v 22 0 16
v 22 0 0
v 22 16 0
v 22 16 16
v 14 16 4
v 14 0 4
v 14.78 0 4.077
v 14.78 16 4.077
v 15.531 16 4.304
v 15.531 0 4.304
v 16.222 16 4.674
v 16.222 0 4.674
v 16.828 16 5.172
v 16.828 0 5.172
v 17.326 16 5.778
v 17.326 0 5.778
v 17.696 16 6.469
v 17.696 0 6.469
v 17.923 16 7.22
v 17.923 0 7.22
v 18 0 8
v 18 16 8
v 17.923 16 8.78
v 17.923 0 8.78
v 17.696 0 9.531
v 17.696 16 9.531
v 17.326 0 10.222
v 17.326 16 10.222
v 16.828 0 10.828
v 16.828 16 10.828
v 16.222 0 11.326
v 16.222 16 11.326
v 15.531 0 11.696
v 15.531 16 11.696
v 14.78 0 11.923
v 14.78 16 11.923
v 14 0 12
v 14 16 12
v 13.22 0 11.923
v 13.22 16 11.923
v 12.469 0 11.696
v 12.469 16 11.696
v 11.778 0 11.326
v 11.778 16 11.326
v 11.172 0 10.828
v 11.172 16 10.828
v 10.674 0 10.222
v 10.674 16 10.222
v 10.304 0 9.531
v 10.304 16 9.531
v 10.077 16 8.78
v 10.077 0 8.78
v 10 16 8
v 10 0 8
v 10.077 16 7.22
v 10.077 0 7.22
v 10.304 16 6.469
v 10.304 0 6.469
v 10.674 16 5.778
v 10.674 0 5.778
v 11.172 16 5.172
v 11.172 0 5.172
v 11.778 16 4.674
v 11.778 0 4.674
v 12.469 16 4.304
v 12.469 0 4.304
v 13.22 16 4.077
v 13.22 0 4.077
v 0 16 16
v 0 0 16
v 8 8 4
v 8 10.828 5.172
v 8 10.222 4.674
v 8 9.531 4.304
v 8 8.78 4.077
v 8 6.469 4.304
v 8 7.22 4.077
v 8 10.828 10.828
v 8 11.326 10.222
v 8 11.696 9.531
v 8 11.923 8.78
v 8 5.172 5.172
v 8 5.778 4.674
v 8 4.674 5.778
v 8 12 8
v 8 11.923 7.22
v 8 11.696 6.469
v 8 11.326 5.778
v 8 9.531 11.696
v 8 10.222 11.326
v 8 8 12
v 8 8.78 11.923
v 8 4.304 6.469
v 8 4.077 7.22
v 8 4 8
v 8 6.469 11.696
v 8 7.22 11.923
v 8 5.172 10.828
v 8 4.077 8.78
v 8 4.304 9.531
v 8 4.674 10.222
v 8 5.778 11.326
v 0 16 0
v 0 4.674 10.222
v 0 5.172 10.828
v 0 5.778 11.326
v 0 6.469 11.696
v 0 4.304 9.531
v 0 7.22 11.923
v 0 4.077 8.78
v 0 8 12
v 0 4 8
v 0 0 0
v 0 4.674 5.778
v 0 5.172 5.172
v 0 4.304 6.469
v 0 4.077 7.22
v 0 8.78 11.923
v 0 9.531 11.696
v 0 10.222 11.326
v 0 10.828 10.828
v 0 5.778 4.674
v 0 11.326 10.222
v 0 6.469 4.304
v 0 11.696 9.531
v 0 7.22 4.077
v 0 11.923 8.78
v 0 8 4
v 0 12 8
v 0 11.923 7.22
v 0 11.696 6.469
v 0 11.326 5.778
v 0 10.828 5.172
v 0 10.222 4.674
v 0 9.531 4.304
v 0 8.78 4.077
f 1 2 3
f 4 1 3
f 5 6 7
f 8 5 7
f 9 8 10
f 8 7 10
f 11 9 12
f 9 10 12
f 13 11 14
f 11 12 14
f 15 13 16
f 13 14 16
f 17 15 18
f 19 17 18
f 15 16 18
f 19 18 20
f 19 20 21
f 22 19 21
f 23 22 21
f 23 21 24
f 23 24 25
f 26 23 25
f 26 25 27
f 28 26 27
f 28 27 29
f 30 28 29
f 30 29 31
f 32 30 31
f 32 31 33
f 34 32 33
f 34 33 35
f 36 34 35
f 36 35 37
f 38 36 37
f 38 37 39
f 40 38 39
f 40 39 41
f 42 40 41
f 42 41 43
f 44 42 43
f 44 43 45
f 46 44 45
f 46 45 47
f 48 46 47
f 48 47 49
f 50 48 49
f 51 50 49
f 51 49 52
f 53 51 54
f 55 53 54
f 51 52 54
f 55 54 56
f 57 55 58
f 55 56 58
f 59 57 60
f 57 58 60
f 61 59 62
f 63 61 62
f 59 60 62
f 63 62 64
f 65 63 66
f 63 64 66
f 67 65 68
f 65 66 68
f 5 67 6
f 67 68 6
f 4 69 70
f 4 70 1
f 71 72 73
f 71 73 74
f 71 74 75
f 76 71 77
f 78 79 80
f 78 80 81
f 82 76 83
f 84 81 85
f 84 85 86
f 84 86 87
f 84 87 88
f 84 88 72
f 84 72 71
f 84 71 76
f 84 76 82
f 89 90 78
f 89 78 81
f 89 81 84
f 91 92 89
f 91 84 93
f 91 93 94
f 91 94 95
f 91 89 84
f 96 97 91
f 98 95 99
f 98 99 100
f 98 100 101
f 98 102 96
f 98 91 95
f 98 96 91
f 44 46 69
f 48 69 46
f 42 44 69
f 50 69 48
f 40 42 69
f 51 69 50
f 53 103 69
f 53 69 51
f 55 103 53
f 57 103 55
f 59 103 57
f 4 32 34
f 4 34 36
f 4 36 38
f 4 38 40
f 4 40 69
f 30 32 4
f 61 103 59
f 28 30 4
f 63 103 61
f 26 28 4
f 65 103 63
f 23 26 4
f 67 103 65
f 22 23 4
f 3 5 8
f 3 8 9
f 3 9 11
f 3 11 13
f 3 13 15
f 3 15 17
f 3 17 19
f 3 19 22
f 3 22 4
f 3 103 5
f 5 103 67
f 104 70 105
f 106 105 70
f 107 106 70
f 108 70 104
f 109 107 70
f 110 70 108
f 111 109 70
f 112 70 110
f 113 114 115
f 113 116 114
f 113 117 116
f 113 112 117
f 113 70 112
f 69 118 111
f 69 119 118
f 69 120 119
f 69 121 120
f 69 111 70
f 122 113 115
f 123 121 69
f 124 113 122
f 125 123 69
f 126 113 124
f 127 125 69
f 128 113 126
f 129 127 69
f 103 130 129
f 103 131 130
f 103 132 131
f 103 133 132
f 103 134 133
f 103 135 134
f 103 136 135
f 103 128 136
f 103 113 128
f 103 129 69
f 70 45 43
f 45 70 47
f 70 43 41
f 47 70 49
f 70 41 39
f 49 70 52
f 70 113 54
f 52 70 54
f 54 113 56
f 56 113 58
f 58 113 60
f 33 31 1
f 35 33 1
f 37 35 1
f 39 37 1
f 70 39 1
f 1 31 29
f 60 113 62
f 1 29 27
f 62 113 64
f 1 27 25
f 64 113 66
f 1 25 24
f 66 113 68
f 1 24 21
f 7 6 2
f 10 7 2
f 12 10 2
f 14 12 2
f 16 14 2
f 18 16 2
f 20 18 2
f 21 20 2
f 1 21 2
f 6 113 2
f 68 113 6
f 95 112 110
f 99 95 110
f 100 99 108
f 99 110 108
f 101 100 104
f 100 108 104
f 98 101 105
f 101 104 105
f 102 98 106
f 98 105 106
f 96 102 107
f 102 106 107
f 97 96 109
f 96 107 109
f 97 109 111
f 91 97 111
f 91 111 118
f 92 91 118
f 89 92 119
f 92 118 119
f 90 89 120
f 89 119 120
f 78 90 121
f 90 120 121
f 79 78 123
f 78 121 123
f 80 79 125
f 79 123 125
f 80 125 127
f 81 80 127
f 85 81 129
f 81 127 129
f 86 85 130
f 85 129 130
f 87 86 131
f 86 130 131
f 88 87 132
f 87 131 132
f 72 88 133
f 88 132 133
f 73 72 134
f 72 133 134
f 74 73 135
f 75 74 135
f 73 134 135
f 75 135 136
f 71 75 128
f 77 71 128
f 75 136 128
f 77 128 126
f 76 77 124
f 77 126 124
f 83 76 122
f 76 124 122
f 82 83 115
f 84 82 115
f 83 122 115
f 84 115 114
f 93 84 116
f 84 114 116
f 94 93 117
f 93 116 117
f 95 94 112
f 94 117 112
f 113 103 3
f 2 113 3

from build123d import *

# Parameters (mm, degrees)
SKETCH1_W           = 22
SKETCH1_H           = 16
BOSS_EXTRUDE1_DEPTH = 16
SKETCH2_R           = 4
CUT_EXTRUDE1_DEPTH  = 8
SKETCH3_R           = 4
CUT_EXTRUDE2_DEPTH  = 17


with BuildPart() as part:
    # Sketch1 → Boss-Extrude1 (new body)
    with BuildSketch(Plane.XY):
        with Locations((11, 8)):
            Rectangle(SKETCH1_W, SKETCH1_H)
    extrude(amount=BOSS_EXTRUDE1_DEPTH)

    # Sketch2 → Cut-Extrude1 (cut)
    with BuildSketch(Plane.ZY):
        with Locations(Location((8, 8, 0), (0, 0, 270))):  # turned: the seam where the file's is
            Circle(SKETCH2_R)
    extrude(amount=-CUT_EXTRUDE1_DEPTH, mode=Mode.SUBTRACT)

    # Sketch3 → Cut-Extrude2 (cut, through all)
    with BuildSketch(Plane.XZ):
        with Locations(Location((14, 8, 0), (0, 0, 270))):  # turned: the seam where the file's is
            Circle(SKETCH3_R)
    extrude(amount=-CUT_EXTRUDE2_DEPTH, mode=Mode.SUBTRACT)


solid = part.part
